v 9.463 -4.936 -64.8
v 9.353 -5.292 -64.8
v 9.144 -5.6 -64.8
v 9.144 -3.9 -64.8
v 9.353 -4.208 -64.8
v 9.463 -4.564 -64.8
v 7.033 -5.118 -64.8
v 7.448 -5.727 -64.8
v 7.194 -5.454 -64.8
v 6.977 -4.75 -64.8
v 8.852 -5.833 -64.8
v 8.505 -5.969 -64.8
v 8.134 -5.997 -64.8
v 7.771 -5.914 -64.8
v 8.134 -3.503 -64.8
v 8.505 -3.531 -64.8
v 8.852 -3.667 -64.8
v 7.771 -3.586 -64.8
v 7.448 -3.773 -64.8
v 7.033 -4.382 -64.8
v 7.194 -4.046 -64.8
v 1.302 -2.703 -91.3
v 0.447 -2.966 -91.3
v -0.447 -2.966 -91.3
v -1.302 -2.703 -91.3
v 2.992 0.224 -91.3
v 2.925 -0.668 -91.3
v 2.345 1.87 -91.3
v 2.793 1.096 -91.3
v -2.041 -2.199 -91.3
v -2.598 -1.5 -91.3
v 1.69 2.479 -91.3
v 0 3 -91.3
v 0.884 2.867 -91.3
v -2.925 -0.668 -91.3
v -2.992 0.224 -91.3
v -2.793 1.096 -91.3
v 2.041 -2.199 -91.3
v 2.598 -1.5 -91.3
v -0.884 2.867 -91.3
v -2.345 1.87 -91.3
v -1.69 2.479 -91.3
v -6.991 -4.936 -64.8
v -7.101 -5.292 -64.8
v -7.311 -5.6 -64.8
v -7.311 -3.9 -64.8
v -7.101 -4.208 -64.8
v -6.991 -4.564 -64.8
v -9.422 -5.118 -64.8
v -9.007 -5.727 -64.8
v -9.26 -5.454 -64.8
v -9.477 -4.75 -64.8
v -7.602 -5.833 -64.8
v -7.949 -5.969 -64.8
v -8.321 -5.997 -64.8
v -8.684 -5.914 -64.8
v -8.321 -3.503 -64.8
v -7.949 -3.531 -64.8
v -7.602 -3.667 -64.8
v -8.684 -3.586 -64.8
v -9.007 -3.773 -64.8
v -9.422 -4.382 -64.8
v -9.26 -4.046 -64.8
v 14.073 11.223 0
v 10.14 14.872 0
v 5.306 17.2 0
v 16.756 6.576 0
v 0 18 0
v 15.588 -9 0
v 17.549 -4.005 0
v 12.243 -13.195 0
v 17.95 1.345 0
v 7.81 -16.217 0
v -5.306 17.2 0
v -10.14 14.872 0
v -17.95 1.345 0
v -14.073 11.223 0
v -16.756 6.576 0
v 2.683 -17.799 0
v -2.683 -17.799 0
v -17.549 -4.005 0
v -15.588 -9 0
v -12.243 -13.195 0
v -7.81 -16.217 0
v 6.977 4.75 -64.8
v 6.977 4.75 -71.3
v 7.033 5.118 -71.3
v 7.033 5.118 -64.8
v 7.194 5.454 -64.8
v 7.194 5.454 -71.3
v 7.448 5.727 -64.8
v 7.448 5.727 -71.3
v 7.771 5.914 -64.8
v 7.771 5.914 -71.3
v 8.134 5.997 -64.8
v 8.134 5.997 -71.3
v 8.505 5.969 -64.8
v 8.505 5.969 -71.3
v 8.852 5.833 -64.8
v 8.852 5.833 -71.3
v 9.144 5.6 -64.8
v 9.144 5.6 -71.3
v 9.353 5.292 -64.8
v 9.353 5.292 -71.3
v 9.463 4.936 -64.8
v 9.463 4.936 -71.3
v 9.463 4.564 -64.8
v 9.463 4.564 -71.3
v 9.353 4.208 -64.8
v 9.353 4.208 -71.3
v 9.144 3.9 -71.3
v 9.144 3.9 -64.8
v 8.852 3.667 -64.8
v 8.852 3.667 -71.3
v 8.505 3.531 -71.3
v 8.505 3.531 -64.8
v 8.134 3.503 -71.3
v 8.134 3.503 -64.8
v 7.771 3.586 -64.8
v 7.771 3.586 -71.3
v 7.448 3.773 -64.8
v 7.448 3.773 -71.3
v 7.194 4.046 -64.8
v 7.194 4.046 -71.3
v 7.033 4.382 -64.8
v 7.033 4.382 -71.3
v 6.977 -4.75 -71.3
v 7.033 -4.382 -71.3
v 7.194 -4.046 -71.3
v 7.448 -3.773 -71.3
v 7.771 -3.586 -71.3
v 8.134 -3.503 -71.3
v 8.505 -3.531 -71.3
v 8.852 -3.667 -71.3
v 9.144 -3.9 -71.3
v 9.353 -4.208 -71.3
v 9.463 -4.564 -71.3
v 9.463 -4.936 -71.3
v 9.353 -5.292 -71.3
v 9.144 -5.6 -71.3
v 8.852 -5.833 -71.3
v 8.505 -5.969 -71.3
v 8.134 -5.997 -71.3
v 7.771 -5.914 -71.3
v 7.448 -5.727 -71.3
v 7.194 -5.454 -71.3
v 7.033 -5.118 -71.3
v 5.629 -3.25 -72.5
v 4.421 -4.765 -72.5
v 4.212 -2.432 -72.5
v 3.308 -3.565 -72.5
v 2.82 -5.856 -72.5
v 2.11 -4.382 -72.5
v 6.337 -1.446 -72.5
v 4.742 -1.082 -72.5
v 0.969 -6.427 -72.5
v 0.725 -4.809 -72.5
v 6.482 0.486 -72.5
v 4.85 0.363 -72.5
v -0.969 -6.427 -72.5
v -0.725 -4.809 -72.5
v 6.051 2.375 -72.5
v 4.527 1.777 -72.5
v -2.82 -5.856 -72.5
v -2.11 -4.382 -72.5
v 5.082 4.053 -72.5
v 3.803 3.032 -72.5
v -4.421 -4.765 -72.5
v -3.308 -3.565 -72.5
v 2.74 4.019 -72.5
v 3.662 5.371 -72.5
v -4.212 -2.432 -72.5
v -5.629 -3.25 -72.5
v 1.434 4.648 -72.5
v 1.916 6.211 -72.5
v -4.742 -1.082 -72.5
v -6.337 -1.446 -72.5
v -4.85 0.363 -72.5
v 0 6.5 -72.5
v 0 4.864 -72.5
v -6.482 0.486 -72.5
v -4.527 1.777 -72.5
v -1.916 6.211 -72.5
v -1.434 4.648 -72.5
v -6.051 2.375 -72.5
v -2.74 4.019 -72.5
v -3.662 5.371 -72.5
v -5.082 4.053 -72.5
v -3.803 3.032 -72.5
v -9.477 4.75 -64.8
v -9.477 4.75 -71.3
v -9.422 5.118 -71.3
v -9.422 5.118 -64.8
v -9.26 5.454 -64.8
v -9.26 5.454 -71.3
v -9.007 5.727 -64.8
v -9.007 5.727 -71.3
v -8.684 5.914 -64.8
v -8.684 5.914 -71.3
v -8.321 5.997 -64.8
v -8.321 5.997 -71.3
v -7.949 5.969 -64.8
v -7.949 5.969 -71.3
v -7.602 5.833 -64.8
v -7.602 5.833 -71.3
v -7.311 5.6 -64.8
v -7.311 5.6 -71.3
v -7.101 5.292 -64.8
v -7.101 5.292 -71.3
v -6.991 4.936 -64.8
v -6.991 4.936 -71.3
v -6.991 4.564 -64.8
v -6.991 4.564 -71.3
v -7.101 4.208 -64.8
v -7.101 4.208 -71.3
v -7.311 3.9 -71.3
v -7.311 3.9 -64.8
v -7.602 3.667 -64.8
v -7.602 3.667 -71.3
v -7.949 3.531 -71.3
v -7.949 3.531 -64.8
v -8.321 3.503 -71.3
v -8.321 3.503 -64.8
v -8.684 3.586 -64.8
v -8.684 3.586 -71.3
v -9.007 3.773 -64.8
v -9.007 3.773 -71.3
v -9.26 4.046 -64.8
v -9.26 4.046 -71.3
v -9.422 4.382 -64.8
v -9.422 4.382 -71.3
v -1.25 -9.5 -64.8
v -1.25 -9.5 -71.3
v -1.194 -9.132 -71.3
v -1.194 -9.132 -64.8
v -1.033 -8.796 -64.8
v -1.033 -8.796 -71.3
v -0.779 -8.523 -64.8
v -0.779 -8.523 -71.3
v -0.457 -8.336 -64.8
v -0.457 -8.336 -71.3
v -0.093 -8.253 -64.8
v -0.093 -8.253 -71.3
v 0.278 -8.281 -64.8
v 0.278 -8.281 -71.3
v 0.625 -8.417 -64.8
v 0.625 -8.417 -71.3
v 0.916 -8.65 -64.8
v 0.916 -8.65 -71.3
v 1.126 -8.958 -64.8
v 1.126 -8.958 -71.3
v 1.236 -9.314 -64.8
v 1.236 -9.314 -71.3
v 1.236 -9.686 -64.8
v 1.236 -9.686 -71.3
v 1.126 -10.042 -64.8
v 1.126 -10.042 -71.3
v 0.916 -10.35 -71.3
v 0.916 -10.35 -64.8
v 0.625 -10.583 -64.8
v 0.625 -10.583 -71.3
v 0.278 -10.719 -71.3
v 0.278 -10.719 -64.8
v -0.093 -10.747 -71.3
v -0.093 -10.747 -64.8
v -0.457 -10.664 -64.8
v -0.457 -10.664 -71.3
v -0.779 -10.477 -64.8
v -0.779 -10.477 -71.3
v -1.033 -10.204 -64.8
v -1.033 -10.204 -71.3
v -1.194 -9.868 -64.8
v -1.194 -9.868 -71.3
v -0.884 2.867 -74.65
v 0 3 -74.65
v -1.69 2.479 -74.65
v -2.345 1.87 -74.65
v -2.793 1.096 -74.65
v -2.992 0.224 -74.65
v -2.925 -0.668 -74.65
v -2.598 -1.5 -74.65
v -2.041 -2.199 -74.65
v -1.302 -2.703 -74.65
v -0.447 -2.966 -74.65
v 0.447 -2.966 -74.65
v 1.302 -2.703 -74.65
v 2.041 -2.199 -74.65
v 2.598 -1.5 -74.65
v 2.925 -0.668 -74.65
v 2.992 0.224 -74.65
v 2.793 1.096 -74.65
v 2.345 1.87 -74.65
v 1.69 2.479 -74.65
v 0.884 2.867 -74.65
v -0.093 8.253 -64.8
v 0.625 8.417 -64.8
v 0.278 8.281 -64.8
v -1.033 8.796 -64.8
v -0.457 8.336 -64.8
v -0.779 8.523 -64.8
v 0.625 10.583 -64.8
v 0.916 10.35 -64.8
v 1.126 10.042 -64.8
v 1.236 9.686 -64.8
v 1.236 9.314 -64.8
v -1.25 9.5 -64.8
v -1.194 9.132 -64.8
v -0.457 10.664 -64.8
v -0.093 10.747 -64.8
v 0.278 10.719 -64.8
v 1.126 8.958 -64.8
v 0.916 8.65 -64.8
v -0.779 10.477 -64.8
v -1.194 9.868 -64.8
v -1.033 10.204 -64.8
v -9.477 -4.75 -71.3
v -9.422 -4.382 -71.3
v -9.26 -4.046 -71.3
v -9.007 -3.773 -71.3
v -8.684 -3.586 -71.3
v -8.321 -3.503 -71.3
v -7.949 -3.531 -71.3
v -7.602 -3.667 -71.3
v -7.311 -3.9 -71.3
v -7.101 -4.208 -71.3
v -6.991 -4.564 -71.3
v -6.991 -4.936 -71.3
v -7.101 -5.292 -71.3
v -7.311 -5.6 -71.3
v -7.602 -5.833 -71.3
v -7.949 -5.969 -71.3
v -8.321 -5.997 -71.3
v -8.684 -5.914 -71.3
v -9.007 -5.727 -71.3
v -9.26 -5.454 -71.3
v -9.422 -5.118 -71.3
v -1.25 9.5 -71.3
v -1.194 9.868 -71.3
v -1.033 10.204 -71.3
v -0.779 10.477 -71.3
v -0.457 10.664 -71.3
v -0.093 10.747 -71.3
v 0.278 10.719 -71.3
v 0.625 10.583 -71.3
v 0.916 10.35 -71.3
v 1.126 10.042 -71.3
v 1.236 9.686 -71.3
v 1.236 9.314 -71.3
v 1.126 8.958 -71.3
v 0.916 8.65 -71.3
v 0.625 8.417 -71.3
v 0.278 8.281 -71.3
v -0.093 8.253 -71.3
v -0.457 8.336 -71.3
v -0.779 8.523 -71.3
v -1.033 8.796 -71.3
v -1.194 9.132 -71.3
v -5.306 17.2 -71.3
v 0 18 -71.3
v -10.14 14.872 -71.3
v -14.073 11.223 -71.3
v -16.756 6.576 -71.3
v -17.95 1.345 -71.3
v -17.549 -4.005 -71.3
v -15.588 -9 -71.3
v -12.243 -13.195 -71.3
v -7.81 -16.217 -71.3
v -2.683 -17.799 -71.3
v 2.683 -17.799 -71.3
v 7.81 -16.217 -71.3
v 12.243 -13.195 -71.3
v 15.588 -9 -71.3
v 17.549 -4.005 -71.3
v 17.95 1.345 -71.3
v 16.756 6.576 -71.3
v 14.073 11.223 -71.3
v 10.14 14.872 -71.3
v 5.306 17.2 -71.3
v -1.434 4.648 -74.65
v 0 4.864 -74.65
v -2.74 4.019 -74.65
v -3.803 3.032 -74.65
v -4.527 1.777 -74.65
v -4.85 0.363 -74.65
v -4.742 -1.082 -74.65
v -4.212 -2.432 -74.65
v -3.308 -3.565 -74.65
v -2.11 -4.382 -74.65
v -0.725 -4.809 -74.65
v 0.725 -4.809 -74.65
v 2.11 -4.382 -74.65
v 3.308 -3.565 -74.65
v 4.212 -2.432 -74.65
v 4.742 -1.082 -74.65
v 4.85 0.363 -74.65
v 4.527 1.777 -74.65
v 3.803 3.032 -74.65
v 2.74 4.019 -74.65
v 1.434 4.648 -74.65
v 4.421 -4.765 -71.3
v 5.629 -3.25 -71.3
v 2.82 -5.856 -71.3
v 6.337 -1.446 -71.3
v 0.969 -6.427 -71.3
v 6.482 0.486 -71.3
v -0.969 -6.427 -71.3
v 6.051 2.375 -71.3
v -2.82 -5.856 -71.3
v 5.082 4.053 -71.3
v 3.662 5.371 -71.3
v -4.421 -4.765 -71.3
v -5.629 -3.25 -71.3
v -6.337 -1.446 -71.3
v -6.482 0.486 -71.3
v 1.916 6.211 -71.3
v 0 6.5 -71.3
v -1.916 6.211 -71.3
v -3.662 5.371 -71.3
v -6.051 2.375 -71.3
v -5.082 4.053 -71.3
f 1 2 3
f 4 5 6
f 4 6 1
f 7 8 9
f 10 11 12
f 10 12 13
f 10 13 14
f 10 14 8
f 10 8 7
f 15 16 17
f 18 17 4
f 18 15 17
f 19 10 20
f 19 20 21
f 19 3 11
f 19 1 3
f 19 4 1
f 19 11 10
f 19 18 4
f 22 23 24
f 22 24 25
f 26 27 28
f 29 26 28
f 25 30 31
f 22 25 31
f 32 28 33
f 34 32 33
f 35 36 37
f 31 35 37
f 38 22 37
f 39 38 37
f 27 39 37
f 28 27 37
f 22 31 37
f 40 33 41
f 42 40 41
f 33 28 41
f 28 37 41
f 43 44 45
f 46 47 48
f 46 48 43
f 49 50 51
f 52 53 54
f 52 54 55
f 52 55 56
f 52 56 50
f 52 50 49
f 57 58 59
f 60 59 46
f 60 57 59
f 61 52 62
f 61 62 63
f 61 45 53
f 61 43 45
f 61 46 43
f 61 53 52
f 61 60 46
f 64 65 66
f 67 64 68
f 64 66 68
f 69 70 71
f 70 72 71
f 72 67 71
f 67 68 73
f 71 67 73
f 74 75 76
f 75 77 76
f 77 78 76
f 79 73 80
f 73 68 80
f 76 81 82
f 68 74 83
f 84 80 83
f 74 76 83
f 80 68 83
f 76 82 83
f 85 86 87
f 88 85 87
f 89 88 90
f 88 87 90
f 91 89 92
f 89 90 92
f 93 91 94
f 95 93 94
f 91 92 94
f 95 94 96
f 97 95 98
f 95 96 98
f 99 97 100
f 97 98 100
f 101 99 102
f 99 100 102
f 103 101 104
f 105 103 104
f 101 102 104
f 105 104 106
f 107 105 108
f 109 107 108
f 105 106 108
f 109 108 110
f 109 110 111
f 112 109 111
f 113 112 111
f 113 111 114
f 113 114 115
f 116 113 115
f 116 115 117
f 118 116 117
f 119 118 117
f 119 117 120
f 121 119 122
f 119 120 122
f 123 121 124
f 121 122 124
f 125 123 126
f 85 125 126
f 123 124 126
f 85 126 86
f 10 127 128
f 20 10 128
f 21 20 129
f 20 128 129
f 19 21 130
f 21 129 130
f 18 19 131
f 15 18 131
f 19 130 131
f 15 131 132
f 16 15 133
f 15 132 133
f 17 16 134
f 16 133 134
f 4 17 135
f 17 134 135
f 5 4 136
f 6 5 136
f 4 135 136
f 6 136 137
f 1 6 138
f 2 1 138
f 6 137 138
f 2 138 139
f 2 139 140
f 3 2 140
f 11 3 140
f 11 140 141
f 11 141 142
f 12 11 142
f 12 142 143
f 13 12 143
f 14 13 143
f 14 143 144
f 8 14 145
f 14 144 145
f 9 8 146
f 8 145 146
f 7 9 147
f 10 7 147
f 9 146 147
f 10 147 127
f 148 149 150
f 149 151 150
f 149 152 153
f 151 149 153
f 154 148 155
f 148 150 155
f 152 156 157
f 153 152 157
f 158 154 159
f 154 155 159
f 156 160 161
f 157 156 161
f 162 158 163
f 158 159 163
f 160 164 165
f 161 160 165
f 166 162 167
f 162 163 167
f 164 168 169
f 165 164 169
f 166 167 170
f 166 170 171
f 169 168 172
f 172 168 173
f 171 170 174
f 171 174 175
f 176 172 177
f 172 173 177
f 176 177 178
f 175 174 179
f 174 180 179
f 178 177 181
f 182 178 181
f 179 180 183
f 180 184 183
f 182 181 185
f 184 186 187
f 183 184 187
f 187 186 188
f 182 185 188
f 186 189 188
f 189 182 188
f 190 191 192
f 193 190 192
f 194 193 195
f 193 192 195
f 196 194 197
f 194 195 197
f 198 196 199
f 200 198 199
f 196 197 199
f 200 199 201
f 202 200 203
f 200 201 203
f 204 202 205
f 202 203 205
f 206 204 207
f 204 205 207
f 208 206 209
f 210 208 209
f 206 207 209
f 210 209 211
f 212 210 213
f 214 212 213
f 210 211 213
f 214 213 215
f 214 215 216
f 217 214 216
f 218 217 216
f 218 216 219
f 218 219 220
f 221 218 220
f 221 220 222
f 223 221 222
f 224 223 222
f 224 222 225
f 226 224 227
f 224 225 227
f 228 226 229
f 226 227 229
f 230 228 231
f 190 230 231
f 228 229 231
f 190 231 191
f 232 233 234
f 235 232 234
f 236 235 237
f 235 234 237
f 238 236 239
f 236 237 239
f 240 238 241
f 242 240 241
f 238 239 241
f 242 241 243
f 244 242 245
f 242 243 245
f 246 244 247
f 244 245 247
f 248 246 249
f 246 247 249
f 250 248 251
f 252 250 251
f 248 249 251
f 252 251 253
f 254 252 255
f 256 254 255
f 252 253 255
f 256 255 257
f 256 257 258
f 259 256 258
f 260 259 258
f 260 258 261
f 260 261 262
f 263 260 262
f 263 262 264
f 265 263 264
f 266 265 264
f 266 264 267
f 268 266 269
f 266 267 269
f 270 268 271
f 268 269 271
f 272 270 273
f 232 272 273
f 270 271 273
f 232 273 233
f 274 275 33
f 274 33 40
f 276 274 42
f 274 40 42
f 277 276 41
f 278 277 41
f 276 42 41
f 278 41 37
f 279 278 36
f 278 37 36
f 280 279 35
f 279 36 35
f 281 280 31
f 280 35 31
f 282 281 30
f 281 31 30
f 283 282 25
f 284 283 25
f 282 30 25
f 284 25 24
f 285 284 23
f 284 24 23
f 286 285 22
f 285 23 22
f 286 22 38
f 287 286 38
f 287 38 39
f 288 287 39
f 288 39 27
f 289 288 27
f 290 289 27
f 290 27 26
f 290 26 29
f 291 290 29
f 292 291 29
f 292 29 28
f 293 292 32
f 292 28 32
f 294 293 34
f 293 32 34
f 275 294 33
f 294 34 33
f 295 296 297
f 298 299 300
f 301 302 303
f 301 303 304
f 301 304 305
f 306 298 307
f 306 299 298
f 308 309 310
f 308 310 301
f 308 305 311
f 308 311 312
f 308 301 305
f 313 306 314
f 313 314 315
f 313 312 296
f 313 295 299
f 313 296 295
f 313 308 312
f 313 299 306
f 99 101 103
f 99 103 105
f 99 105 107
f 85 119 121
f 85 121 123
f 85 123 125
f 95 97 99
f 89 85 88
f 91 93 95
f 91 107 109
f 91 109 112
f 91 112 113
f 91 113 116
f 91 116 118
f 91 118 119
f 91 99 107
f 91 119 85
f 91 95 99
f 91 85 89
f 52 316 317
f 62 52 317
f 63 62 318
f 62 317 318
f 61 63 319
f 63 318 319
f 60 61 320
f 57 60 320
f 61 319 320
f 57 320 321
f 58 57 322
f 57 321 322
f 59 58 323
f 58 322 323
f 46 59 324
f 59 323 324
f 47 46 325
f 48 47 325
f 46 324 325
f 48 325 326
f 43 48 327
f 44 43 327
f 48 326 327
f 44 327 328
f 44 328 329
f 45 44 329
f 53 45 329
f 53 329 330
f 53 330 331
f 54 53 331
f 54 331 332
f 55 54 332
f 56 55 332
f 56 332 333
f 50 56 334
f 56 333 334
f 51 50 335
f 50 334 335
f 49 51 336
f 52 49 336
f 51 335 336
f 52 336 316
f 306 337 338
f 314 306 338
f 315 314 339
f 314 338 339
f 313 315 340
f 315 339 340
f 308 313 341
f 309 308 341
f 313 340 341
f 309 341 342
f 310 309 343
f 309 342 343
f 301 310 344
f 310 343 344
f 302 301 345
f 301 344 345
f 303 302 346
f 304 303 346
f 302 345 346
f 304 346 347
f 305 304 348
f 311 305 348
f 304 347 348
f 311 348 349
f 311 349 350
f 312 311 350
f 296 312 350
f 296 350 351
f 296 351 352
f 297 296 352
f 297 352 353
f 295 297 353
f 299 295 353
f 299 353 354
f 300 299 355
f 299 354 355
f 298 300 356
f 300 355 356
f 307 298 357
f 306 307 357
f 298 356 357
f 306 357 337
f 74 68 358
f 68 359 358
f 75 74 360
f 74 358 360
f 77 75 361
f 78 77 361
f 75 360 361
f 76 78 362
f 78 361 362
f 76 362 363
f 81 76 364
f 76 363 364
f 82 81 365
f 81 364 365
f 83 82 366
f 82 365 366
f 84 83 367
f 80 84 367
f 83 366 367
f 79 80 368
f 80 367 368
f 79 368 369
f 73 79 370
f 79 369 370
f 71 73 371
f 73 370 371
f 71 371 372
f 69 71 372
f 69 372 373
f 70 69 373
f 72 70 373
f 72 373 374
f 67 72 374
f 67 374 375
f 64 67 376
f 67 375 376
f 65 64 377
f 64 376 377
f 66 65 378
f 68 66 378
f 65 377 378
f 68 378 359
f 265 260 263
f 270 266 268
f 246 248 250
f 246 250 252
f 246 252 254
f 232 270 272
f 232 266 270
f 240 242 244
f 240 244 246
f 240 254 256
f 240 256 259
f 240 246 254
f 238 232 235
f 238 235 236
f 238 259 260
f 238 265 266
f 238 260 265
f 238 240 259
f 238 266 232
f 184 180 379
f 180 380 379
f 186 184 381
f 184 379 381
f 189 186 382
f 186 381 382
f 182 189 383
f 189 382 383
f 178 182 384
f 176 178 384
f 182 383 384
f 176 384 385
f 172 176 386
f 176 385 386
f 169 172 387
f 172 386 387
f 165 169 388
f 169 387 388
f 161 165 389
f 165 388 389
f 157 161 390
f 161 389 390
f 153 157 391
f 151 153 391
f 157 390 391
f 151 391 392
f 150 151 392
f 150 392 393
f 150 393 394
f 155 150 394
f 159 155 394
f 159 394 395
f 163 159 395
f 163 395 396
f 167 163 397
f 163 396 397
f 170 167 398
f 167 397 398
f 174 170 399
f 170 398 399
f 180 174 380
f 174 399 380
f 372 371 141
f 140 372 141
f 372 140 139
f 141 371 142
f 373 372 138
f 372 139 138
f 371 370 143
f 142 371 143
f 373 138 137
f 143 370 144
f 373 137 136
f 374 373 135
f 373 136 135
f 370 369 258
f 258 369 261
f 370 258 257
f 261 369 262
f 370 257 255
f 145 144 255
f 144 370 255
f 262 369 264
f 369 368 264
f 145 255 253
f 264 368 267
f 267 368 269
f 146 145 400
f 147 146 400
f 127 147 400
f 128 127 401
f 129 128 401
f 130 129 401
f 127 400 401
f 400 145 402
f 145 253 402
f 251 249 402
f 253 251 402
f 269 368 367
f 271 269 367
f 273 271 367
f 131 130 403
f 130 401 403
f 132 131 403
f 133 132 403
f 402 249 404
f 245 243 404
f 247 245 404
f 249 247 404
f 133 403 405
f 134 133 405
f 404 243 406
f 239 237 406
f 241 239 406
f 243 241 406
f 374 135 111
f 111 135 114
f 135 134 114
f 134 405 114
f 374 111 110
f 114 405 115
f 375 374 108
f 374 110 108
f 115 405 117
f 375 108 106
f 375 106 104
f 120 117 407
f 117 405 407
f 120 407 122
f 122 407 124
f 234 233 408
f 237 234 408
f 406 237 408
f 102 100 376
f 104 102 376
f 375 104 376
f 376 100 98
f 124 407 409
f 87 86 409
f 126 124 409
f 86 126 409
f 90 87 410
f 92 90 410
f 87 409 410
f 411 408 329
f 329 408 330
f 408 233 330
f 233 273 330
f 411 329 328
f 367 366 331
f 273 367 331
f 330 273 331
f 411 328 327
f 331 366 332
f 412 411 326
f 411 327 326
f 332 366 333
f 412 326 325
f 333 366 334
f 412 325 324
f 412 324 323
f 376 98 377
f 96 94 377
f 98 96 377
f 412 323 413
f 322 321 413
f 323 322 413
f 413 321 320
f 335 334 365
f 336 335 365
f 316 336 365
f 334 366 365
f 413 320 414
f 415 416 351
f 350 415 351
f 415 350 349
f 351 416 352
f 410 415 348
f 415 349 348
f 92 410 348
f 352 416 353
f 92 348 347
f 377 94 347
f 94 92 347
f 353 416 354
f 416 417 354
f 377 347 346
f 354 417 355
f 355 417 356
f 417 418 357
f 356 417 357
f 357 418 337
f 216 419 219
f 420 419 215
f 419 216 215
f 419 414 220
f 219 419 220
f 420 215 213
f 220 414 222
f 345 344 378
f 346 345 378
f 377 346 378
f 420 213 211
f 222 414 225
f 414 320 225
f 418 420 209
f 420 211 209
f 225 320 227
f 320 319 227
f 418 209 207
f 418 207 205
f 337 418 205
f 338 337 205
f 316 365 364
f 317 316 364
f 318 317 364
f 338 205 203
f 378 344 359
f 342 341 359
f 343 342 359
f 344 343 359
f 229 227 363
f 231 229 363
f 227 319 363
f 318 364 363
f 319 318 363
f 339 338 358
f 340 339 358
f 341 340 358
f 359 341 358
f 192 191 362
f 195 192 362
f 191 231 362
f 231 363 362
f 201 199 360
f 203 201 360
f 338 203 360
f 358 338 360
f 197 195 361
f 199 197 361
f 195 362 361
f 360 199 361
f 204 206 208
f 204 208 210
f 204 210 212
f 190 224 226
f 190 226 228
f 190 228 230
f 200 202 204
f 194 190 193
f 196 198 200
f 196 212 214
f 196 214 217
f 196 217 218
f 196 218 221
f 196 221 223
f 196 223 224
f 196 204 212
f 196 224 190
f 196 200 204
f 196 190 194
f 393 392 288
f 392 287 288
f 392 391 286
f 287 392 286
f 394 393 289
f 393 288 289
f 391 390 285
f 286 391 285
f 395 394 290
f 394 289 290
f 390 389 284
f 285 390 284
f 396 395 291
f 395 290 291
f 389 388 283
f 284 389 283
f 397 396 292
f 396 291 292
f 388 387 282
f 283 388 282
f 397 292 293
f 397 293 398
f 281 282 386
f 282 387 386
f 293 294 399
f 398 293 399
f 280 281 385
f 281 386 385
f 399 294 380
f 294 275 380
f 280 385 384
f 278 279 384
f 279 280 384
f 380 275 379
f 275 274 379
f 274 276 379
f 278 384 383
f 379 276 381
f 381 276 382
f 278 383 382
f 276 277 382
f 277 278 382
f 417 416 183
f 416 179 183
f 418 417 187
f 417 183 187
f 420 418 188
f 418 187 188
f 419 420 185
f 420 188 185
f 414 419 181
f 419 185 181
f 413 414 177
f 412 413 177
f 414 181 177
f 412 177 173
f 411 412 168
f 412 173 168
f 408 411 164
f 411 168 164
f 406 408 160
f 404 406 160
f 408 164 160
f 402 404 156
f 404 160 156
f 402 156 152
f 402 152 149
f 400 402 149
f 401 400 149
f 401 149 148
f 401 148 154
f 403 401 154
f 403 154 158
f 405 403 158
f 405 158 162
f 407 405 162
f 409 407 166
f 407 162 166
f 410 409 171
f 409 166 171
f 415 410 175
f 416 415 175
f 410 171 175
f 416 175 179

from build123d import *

# Parameters (mm, degrees)
SKETCH2_R          = 1.25
CUT_EXTRUDE1_DEPTH = 6.5


with BuildPart() as part:
    # Sketch1 → Revolve1 (revolve)
    with BuildSketch(Plane(origin=(0, 0, 0), x_dir=(0, 0, -1), z_dir=(1, 0, 0))):
        Polygon((0, 0), (0, 18), (71.3, 18), (71.3, 6.5), (72.5, 6.5), (72.5, 4.863636364), (74.65, 4.863636364), (74.65, 3), (91.3, 3), (91.3, 0), align=None)
    revolve(axis=Axis((0, 0, -91.3), (0, 0, 1)))

    # Sketch2 → Cut-Extrude1 (cut)
    with BuildSketch(Plane(origin=(0, 0, -71.3), x_dir=(-1, 0, 0), z_dir=(0, 0, -1))):
        with Locations((0, 9.5)):
            Circle(SKETCH2_R)
        with Locations((8.227241336, 4.75)):
            Circle(SKETCH2_R)
        with Locations((8.227241336, -4.75)):
            Circle(SKETCH2_R)
        with Locations((0, -9.5)):
            Circle(SKETCH2_R)
        with Locations((-8.227241336, -4.75)):
            Circle(SKETCH2_R)
        with Locations((-8.227241336, 4.75)):
            Circle(SKETCH2_R)
    extrude(amount=-CUT_EXTRUDE1_DEPTH, mode=Mode.SUBTRACT)


solid = part.part
